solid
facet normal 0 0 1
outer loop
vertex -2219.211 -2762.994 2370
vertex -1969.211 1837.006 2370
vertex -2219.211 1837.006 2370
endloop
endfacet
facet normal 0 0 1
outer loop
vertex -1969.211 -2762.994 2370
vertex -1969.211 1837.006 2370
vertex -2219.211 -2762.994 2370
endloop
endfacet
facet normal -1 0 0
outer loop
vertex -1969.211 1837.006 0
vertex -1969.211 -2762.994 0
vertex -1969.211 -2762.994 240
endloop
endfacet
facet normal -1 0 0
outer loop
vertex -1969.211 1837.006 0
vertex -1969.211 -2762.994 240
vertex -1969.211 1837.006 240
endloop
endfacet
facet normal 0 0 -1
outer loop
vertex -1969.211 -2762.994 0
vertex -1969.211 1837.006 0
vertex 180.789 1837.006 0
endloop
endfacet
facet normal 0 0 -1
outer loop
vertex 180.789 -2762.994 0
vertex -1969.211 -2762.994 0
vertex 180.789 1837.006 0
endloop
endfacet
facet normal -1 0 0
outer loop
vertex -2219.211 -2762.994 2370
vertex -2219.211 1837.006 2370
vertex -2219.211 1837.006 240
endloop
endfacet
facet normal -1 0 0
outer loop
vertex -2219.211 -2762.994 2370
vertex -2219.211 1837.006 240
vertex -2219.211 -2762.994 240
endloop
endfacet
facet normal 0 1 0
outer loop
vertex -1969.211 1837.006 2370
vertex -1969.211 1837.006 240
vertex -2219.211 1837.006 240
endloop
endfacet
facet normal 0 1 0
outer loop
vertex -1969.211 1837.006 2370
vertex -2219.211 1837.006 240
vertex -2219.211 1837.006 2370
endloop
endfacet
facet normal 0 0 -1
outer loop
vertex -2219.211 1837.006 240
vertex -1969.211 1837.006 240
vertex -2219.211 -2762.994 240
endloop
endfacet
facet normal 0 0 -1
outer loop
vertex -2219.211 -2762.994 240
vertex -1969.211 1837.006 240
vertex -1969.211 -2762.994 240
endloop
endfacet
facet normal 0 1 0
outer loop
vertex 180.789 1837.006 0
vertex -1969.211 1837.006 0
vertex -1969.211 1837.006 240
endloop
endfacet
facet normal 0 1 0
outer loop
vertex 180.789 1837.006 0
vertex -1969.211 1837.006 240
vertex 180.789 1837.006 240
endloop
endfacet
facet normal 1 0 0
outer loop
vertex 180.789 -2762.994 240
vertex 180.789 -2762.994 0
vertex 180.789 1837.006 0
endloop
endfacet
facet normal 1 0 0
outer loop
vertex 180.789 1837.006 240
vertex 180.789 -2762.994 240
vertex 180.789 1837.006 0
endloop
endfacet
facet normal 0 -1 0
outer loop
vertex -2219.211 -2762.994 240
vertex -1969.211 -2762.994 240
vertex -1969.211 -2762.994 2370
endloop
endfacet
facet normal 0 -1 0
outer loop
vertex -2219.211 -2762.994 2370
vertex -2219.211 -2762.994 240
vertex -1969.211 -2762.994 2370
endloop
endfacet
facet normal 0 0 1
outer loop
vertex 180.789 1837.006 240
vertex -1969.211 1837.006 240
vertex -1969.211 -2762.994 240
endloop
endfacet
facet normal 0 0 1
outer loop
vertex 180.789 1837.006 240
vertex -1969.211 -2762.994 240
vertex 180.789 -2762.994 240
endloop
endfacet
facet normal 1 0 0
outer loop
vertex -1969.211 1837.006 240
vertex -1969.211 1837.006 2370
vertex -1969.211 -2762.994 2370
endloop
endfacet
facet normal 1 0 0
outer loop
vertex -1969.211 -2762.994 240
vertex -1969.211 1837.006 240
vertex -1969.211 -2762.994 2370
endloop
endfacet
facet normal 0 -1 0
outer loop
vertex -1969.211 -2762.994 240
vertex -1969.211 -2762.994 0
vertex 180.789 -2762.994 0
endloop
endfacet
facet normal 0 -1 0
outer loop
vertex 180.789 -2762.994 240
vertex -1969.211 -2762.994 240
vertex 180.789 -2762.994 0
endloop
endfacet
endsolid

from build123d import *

# Parameters (mm, degrees)
F0_W     = 1000
F0_H     = 1030
F1_DEPTH = 1
F2_W     = 995.0948357582
F2_H     = 1797.5890636444
F3_DEPTH = 100
F5_W     = 2150
F5_H     = 4600
F6_DEPTH = 240
F7_W     = 4600
F7_H     = 2130
F8_DEPTH = 250


with BuildPart() as f1:
    # F0 (on Front) → F1 (new body)
    with BuildSketch(Plane.XZ):
        with Locations((500, 515)):
            Rectangle(F0_W, F0_H)
    extrude(amount=F1_DEPTH)

    # F2 (on Top) → F3 (join)
    with BuildSketch(Plane.XY):
        with Locations((497.5474178791, -898.7945318222)):
            Rectangle(F2_W, F2_H)
    extrude(amount=F3_DEPTH)


with BuildPart() as f6:
    # F5 (on Top) → F6 (new body)
    with BuildSketch(Plane.XY):
        with Locations((-894.210924619, -462.9937782884)):
            Rectangle(F5_W, F5_H)
    extrude(amount=F6_DEPTH)


with BuildPart() as f8:
    # F7 (on face) → F8 (new body)
    with BuildSketch(Plane(origin=(-1969.210924619, 0, 0), x_dir=(0, -1, 0), z_dir=(-1, 0, 0))):
        with Locations((462.9937782884, 1305)):
            Rectangle(F7_W, F7_H)
    extrude(amount=F8_DEPTH)


solid = Compound([f6.part, f8.part])
